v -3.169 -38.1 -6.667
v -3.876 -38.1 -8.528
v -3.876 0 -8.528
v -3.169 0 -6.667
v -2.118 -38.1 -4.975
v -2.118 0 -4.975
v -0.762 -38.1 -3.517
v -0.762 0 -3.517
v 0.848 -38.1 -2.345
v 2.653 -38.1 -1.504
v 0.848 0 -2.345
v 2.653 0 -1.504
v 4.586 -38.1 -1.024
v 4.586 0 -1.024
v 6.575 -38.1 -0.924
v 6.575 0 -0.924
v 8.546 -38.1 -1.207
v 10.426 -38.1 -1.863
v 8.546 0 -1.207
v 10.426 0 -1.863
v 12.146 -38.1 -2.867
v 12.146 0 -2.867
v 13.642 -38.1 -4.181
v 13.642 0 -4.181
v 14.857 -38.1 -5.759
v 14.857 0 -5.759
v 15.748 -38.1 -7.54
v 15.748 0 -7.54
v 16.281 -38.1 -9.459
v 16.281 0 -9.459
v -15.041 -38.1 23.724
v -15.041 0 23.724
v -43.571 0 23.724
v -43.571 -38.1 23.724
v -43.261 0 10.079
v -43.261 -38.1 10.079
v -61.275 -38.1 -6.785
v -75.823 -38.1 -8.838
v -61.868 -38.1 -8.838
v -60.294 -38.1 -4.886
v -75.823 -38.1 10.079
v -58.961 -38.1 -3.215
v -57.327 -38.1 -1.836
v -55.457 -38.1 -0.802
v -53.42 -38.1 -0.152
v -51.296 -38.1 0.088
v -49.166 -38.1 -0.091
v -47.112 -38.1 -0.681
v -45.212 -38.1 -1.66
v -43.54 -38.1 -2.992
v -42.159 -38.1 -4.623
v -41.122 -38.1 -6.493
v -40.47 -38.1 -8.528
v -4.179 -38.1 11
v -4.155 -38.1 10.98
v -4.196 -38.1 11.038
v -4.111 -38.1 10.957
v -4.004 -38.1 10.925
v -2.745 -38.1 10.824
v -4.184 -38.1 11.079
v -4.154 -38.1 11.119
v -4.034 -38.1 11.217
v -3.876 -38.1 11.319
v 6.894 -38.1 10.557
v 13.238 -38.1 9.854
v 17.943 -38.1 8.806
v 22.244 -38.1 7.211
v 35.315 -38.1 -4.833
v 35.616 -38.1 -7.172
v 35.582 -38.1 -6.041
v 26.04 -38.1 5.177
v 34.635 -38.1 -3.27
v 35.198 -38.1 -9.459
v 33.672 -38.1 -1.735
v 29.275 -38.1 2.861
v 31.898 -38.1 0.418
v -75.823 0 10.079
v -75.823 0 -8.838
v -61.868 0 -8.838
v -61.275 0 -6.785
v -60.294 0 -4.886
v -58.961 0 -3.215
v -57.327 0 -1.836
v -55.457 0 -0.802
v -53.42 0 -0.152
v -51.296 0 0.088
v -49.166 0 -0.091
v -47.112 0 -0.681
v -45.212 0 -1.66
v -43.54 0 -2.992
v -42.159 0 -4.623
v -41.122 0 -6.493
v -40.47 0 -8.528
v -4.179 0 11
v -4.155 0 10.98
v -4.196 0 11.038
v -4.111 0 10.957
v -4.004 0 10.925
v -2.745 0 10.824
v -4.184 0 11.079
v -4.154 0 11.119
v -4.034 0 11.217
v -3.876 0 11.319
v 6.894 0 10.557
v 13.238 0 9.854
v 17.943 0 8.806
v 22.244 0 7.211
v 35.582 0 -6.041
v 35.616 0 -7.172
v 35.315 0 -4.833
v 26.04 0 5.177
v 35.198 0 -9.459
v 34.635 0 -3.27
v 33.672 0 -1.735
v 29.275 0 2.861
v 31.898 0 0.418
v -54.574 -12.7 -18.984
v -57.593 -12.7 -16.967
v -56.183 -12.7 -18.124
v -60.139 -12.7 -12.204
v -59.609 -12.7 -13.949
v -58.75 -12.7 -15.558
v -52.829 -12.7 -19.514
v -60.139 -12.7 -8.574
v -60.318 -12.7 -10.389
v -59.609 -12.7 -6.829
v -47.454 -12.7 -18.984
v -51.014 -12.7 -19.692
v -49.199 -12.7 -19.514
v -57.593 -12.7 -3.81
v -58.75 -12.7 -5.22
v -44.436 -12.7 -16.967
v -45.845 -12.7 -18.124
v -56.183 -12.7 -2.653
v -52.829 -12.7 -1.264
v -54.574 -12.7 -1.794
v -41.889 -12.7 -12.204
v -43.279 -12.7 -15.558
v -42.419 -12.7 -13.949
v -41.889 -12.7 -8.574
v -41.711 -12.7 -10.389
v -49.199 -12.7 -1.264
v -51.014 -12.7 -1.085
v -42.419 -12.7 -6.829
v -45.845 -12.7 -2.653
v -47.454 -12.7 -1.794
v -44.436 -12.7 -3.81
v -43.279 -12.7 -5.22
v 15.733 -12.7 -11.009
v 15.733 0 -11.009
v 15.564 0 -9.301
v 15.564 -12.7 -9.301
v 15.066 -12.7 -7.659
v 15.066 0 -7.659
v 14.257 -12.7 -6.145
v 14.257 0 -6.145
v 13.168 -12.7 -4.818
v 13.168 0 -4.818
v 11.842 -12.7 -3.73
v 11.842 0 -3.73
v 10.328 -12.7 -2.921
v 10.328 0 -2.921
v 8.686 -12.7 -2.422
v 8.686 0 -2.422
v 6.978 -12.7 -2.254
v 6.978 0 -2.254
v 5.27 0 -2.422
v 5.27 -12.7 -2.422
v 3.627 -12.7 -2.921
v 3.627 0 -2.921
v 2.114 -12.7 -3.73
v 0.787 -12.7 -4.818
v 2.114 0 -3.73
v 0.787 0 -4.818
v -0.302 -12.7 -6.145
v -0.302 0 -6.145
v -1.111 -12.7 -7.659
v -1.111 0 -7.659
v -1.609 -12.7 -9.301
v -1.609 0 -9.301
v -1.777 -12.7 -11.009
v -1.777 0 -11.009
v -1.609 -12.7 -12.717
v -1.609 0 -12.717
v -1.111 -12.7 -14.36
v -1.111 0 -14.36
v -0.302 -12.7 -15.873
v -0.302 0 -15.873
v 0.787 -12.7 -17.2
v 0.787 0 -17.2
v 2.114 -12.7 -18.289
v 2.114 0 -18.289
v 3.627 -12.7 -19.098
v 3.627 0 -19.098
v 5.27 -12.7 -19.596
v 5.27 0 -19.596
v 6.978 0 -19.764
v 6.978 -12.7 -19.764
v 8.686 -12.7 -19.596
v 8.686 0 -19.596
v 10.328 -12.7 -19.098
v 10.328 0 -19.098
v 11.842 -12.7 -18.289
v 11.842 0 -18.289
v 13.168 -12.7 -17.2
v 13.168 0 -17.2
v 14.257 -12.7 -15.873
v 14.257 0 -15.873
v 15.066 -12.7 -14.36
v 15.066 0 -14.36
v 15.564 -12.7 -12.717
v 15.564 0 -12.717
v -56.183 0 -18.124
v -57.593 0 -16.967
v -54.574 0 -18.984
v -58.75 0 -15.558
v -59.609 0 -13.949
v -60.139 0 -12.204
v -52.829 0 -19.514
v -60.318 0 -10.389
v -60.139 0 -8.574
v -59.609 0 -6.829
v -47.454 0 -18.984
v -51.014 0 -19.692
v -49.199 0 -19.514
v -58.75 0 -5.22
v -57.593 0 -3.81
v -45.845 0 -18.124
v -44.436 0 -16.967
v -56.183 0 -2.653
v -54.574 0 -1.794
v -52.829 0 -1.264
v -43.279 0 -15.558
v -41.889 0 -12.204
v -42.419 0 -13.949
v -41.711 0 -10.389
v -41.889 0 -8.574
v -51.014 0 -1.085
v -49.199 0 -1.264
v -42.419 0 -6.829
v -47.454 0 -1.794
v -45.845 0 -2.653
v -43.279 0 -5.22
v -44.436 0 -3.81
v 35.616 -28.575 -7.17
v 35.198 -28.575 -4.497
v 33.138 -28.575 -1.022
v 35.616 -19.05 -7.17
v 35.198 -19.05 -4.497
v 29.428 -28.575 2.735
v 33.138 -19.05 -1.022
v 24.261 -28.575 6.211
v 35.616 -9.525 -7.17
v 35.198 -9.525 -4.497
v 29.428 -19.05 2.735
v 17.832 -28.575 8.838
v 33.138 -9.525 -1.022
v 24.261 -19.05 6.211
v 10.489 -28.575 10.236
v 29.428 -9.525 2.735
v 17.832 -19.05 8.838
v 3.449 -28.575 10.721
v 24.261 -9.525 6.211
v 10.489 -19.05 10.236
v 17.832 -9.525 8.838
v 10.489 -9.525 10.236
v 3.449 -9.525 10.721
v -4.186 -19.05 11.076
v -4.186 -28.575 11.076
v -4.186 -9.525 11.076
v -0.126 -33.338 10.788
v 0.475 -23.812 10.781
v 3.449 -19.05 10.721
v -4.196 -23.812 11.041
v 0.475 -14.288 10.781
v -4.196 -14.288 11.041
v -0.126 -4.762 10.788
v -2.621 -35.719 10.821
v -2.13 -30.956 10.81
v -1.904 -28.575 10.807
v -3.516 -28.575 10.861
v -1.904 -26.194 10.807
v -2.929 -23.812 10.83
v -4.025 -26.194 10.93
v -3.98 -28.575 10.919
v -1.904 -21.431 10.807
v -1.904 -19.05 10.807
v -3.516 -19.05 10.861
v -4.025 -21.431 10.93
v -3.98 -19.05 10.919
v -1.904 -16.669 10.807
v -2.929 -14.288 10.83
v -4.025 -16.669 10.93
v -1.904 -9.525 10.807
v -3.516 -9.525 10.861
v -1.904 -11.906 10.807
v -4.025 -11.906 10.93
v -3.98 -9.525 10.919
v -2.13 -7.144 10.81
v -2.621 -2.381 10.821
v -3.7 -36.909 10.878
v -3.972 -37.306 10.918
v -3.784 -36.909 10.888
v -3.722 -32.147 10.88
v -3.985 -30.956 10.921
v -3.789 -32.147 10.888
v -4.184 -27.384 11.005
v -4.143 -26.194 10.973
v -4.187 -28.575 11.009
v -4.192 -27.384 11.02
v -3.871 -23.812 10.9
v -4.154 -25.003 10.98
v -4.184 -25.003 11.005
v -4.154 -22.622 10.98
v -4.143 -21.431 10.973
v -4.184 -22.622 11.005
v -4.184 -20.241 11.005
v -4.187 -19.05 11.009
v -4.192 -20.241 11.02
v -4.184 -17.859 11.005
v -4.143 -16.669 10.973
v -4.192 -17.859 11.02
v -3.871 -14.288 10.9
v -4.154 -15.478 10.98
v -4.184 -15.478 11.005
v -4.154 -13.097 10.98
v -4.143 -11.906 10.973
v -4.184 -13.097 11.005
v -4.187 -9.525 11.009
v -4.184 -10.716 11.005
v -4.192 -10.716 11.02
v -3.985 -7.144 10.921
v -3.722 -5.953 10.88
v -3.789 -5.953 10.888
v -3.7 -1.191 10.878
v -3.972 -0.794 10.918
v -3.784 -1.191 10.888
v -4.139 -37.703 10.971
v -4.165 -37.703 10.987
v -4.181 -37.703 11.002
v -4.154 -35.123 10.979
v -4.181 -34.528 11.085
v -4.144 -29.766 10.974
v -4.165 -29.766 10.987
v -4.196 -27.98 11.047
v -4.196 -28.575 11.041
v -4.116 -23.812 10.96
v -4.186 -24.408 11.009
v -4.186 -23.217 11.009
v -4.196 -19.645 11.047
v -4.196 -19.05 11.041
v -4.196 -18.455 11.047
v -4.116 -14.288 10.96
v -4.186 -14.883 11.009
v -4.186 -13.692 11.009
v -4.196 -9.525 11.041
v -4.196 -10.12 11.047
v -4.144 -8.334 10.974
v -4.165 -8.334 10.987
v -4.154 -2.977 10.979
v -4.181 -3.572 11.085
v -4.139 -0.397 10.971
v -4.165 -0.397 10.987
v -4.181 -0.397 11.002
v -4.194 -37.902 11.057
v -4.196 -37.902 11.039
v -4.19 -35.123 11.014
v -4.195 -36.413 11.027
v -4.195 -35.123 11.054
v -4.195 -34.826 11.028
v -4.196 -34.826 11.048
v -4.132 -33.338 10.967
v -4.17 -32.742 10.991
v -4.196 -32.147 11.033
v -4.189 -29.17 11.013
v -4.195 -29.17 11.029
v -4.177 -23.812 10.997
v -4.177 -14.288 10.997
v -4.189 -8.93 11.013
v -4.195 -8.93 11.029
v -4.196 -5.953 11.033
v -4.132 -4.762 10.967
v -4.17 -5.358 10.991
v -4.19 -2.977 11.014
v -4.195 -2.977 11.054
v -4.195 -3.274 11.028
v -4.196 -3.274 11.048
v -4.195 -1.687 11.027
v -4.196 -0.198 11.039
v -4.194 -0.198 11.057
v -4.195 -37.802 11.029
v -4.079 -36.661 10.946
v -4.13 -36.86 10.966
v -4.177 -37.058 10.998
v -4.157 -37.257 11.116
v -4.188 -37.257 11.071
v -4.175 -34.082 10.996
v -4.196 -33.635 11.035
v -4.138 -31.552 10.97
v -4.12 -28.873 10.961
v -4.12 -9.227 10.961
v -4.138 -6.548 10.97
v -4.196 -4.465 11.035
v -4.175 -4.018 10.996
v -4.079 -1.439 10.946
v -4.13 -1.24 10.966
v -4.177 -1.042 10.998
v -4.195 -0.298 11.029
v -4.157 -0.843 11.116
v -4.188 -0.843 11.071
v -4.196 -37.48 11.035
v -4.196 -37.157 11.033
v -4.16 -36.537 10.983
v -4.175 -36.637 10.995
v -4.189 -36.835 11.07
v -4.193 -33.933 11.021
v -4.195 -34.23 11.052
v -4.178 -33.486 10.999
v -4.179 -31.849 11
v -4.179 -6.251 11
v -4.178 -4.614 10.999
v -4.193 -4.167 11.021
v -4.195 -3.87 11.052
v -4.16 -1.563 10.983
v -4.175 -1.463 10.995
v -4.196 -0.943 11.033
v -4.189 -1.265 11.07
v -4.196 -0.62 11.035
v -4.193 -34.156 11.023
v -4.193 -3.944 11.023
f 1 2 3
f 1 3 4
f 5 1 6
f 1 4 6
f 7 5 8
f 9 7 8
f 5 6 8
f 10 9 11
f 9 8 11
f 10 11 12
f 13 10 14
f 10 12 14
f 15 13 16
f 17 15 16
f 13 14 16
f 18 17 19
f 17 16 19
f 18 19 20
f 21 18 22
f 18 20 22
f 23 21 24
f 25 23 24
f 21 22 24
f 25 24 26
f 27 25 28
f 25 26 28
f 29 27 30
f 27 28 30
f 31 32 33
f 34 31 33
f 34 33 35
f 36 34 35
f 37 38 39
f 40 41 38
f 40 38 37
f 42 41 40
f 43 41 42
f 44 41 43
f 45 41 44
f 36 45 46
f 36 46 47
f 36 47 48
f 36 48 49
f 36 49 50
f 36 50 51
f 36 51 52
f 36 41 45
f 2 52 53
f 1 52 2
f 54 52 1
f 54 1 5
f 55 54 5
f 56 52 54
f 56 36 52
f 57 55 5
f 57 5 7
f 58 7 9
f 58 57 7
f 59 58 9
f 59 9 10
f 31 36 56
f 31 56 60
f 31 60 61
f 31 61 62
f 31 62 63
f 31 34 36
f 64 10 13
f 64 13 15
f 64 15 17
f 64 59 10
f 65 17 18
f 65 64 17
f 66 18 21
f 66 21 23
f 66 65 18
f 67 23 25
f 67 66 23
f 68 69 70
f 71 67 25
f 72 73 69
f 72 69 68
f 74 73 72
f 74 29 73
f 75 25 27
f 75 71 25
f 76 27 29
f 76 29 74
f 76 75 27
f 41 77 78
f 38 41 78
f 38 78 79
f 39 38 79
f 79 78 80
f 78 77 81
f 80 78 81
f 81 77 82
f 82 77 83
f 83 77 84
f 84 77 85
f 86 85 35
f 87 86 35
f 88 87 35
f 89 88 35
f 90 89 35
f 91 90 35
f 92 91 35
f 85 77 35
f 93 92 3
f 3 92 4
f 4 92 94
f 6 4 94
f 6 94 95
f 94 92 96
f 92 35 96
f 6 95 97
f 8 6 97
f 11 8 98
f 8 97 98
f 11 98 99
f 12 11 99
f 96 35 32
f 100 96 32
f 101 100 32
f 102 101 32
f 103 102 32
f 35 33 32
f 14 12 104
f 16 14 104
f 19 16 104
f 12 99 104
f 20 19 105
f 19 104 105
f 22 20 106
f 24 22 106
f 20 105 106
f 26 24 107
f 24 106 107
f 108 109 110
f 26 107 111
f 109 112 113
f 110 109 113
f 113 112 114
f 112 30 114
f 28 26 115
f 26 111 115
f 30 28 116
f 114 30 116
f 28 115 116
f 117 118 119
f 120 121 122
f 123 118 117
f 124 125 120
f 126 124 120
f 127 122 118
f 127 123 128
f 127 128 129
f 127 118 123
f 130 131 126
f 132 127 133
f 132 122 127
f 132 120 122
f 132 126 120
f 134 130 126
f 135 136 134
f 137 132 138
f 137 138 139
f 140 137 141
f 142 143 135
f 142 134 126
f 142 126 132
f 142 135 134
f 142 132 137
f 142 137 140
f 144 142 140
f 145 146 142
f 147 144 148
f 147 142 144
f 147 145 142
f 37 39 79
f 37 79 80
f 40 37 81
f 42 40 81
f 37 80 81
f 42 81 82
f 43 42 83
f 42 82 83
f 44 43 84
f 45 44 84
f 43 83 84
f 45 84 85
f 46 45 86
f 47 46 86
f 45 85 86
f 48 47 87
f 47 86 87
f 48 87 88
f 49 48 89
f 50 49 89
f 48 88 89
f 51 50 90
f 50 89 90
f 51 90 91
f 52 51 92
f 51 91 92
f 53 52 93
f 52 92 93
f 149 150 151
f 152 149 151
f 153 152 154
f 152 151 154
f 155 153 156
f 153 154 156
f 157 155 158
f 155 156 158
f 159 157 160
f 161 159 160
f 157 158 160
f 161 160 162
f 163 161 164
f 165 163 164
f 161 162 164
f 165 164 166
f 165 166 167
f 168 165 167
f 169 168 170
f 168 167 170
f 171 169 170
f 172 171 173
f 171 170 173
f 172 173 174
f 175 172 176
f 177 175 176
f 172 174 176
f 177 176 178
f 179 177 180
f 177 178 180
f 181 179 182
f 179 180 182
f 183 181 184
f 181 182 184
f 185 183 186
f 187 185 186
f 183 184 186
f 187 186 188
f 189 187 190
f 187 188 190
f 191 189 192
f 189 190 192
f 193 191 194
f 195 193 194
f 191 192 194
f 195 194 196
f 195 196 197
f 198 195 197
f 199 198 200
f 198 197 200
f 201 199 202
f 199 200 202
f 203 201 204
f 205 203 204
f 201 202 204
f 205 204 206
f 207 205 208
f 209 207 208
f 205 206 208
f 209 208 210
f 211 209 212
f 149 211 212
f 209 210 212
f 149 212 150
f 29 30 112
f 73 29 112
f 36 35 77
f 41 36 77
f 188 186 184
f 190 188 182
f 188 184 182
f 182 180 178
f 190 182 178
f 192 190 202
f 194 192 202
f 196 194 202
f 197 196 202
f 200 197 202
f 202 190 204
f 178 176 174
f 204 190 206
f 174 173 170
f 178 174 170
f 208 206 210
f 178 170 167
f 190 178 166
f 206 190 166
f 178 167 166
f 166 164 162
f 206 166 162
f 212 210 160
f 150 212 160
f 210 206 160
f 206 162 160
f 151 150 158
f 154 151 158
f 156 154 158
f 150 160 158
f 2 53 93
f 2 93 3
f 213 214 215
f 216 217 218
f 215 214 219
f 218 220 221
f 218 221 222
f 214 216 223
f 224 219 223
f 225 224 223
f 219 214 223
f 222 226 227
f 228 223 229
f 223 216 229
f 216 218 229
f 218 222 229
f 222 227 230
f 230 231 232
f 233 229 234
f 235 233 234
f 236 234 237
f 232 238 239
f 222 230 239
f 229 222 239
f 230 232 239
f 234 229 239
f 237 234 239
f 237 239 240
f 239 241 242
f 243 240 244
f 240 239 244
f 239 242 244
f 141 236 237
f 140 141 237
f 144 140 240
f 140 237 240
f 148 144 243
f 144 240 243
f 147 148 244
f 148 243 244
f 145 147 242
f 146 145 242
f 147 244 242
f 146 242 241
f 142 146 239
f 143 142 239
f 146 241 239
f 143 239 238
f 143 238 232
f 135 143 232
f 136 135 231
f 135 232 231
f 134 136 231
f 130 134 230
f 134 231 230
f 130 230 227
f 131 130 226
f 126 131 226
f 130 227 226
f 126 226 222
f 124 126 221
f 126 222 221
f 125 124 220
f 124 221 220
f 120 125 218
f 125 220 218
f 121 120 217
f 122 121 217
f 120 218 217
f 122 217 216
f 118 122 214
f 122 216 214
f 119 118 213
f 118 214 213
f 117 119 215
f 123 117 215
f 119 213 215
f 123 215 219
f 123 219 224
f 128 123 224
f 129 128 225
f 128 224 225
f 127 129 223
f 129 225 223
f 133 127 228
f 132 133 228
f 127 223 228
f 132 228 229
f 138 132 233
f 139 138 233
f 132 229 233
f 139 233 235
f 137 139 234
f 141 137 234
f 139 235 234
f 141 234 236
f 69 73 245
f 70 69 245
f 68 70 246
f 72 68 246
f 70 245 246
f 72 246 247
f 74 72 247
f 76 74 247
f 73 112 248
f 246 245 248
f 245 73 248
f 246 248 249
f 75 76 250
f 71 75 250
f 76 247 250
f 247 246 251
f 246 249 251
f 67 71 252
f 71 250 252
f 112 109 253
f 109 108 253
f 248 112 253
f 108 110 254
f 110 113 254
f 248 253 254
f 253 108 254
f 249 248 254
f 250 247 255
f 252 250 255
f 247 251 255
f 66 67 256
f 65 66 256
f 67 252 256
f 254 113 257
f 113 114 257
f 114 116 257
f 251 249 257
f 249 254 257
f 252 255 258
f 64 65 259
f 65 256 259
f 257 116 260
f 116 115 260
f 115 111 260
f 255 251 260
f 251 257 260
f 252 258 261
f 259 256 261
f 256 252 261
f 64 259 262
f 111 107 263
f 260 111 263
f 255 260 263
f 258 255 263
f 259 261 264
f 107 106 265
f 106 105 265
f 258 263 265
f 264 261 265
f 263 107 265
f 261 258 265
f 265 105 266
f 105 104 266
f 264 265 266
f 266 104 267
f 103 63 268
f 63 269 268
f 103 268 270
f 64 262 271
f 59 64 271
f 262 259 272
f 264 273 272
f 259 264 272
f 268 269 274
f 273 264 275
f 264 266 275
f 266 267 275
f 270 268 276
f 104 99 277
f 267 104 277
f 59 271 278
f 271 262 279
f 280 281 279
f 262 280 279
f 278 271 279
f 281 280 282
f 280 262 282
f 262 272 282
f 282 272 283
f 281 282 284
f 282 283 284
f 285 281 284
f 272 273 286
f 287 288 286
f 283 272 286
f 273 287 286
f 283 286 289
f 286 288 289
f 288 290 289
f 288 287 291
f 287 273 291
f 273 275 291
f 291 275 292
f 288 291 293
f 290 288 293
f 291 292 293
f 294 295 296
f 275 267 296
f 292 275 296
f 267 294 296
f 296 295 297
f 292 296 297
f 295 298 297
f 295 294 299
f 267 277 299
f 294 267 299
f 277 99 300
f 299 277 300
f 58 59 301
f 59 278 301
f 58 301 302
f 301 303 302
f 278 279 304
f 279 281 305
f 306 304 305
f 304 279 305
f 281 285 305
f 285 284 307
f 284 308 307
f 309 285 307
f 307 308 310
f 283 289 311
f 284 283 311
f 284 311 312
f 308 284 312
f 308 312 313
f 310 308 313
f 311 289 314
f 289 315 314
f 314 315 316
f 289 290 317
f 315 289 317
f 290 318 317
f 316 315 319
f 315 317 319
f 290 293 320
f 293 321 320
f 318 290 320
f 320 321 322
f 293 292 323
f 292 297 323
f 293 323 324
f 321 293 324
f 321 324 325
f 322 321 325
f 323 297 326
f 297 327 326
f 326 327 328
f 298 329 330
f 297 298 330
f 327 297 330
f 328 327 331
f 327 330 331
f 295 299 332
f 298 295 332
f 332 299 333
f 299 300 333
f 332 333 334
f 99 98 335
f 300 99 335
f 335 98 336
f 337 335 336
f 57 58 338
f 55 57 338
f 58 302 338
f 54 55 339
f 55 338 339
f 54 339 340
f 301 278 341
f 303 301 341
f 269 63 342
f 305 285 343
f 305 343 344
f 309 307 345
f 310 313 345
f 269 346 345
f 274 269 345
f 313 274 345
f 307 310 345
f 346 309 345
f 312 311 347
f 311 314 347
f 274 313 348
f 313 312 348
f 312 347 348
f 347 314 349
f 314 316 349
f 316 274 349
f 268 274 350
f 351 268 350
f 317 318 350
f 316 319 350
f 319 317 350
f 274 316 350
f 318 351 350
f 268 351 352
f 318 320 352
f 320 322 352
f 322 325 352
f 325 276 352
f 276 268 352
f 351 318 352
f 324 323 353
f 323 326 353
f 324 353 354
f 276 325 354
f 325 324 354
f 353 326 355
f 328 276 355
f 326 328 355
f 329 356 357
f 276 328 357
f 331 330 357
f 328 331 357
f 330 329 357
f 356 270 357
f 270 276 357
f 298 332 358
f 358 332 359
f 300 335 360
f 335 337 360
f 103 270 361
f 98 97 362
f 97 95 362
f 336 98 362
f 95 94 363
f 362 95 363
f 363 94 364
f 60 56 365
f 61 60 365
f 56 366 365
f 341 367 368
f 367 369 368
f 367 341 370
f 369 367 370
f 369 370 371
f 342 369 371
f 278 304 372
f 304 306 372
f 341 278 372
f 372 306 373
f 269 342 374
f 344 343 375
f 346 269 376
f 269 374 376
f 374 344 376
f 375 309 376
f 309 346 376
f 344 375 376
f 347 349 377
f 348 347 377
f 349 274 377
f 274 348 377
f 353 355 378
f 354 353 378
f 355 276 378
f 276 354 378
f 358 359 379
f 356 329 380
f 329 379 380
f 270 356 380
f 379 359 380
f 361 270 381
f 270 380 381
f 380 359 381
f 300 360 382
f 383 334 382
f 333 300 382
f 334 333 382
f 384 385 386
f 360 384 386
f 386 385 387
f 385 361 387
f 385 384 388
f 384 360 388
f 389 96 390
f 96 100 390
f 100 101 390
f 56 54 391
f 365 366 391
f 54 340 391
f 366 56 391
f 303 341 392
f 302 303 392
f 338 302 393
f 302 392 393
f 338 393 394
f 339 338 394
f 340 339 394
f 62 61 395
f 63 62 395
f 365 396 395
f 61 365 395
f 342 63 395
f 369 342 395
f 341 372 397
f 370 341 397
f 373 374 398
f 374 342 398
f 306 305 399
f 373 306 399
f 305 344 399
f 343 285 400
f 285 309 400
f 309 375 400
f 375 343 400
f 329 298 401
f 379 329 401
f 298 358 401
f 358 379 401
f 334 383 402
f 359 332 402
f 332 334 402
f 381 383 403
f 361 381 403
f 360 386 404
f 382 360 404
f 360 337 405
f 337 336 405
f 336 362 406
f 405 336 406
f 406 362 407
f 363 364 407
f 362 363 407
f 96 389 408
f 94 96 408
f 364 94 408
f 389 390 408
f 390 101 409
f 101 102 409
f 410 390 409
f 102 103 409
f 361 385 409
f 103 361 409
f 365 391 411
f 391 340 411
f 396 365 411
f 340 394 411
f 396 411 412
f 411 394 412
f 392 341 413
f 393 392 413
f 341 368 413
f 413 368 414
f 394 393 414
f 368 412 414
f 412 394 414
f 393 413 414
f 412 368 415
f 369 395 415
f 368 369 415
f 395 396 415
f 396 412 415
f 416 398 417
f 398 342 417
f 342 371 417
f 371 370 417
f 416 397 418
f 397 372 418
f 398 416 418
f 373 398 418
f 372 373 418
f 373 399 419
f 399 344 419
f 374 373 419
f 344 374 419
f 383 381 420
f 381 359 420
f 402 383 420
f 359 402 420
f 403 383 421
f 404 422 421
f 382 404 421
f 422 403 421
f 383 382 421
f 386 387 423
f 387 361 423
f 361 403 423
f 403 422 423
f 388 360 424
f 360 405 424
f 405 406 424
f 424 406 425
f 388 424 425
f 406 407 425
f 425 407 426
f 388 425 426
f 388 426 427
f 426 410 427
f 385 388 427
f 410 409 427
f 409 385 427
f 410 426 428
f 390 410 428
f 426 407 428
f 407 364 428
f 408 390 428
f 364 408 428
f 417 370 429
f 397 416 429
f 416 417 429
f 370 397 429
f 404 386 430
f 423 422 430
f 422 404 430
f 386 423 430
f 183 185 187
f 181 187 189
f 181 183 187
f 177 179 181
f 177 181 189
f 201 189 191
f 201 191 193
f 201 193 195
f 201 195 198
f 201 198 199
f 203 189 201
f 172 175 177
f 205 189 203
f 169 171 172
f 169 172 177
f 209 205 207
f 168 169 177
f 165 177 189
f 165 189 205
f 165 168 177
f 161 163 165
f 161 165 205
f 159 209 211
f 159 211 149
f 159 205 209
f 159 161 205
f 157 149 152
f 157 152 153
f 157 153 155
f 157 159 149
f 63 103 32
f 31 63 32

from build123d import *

# Parameters (mm, degrees)
F1_DEPTH = 38.1
F2_R     = 8.7549557155
F3_DEPTH = 12.7
F2_R_2   = 9.303489048


with BuildPart() as f1:
    # F0 (on Front) → F1 (new body)
    with BuildSketch(Plane.XZ):
        with BuildLine():
            Line((-43.2612225413, 10.0787794217), (-75.8234262466, 10.0787794217))
            Line((-75.8234262466, 10.0787794217), (-75.8234262466, -8.838314563))
            Line((-75.8234262466, -8.838314563), (-61.868198216, -8.838314563))
            ThreePointArc((-61.868198216, -8.838314563), (-51.2963041719, 0.0878352511), (-40.4701754451, -8.5281981155))
            Line((-40.4701754451, -8.5281981155), (-3.8764537312, -8.5281981155))
            ThreePointArc((-3.8764537312, -8.5281981155), (6.5747502044, -0.9241754014), (16.2811055779, -9.4585465267))
            Line((16.2811055779, -9.4585465267), (35.1982004941, -9.4585465267))
            add(Edge.make_bspline(
                [(35.1982004941, -9.4585465267), (35.5695992614, -7.9755231569), (36.7211815655, -3.3771679137), (20.6498439118, 12.6402998065), (-5.53188109, 10.2770687279), (-4.0583151347, 11.2047524666), (-3.8764537312, 11.3192433491)],
                knots=[0, 0, 0, 0, 0.1815013138, 0.5627743534, 0.9460394226, 1, 1, 1, 1], degree=3))
            Line((-3.8764537312, 11.3192433491), (-15.0406407192, 23.7238947302))
            Line((-15.0406407192, 23.7238947302), (-43.5713380575, 23.7238947302))
            Line((-43.5713380575, 23.7238947302), (-43.2612225413, 10.0787794217))
        make_face()
    extrude(amount=F1_DEPTH)


with BuildPart() as f3:
    # F2 (on Front) → F3 (new body)
    with BuildSketch(Plane.XZ):
        with Locations((6.9776182063, -11.0091287643)):
            Circle(F2_R)
    extrude(amount=F3_DEPTH)


with BuildPart() as f3b:
    # F2 (on Front) → F3, piece 2 (new body)
    with BuildSketch(Plane.XZ):
        with Locations((-51.0141290724, -10.3888958693)):
            Circle(F2_R_2)
    extrude(amount=F3_DEPTH)


solid = Compound([f1.part, f3.part, f3b.part])
